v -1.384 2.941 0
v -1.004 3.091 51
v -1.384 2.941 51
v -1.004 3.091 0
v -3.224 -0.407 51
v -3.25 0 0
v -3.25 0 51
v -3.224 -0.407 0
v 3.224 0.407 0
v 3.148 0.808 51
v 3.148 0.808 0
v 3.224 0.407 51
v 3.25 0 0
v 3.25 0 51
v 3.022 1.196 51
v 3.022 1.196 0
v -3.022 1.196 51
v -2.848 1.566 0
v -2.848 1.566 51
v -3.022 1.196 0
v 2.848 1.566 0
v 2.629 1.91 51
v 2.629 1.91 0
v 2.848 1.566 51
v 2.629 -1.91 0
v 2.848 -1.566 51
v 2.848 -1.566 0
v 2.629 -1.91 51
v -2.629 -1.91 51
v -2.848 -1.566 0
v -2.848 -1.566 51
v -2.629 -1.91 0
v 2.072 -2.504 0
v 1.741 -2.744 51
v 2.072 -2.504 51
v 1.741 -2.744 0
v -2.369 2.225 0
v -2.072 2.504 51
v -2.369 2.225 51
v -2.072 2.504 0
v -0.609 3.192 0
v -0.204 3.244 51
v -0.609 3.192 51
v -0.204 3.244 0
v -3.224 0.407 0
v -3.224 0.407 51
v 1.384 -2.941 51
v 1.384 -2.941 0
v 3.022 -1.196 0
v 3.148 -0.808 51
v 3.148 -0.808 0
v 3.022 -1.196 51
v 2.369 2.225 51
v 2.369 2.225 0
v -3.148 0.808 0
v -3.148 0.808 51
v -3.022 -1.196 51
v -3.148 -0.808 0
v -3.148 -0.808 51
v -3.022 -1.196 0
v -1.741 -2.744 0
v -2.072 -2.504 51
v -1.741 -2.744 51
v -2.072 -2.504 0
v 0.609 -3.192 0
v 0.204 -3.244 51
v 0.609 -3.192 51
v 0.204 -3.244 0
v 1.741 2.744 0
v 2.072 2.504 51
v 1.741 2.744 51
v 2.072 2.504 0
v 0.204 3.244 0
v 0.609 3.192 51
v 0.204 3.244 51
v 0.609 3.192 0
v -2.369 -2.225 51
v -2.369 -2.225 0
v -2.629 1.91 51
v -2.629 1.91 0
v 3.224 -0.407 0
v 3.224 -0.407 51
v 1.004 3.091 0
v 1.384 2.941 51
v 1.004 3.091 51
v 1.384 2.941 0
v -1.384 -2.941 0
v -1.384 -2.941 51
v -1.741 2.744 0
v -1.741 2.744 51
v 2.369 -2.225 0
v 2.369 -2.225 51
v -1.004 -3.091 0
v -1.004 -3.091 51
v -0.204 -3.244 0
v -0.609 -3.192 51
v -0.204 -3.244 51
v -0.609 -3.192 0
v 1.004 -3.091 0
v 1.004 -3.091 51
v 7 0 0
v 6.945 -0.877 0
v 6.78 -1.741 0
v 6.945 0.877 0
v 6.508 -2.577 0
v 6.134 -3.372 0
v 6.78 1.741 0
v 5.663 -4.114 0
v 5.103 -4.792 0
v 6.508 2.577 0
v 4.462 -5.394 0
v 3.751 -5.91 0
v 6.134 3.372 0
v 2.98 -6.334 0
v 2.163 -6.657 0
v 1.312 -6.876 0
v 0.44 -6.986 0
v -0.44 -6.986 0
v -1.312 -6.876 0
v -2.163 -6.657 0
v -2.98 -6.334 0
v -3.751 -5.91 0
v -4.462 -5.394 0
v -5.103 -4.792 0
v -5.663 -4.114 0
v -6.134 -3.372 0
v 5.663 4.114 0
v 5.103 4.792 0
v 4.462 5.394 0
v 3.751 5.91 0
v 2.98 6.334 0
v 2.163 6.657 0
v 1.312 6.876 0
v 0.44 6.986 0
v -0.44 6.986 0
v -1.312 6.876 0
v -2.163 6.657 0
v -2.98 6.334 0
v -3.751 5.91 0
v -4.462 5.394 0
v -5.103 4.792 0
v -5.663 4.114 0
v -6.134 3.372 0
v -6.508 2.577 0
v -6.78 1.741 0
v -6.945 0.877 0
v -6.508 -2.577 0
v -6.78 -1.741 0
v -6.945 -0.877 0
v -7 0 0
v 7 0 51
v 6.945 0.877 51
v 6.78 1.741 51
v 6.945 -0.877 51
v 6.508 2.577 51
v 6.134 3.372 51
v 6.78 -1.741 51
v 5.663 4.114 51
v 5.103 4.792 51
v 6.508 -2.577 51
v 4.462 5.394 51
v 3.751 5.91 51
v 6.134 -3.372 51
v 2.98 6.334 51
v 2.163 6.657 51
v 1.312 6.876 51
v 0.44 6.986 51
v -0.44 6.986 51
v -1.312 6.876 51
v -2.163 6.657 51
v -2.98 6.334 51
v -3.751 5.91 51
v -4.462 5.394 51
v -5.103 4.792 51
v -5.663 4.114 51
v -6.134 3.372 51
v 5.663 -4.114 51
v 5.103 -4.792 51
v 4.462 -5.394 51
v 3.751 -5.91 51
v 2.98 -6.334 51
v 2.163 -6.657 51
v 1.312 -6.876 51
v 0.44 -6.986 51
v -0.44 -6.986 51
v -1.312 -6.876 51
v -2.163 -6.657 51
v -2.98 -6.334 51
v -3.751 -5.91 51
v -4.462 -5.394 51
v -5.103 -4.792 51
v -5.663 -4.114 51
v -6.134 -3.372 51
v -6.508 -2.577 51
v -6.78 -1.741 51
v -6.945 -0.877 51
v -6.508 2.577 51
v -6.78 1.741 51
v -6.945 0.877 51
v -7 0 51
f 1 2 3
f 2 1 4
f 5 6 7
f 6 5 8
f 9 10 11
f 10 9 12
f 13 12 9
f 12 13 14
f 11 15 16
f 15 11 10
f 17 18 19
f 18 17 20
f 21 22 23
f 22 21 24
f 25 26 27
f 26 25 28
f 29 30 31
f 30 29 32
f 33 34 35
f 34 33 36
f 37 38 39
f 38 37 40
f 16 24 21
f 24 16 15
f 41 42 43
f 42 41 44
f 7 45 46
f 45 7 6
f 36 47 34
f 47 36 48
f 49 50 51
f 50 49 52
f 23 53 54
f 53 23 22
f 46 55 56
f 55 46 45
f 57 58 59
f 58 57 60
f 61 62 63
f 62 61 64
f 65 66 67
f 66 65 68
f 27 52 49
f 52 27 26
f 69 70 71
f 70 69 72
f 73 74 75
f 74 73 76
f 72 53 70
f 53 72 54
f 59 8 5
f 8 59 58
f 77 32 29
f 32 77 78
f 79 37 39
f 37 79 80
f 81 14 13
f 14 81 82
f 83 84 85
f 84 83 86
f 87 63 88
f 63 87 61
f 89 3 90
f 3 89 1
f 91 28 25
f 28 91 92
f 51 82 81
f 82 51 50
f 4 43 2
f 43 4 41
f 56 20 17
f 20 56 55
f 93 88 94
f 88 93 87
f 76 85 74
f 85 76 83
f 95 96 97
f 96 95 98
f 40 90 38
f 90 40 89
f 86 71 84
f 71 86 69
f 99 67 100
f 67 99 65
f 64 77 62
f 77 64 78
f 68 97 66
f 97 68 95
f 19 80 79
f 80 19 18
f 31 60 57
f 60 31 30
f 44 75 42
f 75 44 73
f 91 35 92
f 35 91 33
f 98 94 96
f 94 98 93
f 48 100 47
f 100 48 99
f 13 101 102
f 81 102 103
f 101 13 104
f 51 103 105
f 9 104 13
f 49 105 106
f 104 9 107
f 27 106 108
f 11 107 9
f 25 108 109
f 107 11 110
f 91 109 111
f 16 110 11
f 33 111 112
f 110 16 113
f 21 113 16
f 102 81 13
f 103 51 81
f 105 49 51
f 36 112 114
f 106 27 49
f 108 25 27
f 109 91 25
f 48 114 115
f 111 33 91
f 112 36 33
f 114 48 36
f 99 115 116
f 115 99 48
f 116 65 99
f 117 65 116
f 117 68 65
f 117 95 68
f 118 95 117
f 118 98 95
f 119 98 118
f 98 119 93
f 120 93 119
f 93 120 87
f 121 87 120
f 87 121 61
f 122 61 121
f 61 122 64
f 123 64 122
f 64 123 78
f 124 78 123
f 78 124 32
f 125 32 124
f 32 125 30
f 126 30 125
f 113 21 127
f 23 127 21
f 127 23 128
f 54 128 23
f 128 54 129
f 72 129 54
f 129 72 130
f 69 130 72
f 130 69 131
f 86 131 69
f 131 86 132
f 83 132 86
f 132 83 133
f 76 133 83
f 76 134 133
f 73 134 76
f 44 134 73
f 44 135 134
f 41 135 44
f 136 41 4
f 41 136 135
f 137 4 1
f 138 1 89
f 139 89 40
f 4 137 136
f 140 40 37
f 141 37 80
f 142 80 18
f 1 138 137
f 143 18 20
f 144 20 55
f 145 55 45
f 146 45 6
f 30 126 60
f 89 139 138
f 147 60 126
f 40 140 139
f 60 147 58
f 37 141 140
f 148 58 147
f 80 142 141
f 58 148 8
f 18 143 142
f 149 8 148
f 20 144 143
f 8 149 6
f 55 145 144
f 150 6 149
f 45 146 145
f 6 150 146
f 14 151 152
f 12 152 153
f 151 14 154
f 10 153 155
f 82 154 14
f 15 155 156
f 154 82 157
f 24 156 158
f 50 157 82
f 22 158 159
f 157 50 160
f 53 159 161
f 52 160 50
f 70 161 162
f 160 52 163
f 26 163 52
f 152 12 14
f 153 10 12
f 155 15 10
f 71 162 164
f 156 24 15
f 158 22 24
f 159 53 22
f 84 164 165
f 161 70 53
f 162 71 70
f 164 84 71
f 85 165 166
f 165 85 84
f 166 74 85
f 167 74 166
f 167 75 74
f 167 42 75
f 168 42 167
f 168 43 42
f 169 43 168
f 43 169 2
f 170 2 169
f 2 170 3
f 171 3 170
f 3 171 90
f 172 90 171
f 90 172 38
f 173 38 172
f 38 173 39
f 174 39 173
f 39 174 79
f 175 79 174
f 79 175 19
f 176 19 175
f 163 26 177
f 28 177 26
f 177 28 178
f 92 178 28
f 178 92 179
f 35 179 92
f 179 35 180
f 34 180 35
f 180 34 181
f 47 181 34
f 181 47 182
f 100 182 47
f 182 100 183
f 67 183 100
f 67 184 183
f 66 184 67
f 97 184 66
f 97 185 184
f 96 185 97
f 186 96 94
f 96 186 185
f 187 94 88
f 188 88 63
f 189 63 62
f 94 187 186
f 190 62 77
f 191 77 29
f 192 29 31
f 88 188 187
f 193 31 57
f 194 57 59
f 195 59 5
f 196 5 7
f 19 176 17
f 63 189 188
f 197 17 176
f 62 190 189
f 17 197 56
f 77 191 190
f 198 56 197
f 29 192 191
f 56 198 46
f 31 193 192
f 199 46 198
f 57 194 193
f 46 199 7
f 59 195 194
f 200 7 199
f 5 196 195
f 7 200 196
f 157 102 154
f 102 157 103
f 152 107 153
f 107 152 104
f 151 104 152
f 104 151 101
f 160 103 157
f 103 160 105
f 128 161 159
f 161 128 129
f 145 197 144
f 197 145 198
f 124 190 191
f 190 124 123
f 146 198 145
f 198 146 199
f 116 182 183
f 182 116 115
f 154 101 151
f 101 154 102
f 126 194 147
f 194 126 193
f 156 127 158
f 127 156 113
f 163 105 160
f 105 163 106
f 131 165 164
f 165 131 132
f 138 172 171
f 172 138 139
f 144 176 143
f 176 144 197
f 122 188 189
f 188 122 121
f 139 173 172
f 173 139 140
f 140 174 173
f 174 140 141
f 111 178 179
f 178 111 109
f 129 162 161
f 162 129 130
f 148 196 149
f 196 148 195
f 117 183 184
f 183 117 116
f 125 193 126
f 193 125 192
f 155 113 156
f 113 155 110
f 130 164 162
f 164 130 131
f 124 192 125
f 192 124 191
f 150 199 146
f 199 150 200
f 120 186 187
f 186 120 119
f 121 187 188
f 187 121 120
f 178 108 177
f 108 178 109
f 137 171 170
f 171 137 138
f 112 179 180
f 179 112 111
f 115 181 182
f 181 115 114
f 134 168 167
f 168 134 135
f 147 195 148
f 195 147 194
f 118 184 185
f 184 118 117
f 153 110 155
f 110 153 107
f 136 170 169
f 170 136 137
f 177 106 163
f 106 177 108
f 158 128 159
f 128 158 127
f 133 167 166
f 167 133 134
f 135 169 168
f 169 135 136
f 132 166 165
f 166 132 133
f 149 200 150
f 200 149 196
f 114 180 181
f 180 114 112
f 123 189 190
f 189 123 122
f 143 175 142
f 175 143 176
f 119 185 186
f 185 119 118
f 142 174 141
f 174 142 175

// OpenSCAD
$fn = 50;


difference() {
	union() {
		cylinder(h = 51, r = 7.0000000000);
	}
	union() {
		cylinder(h = 51, r = 3.2500000000);
		cylinder(h = 51, r = 3.2500000000);
		cylinder(h = 51, r = 1.8000000000);
		cylinder(h = 51, r = 1.8000000000);
		cylinder(h = 51, r = 1.8000000000);
		cylinder(h = 51, r = 1.8000000000);
		cylinder(h = 51, r = 1.8000000000);
		cylinder(h = 51, r = 1.8000000000);
	}
}
